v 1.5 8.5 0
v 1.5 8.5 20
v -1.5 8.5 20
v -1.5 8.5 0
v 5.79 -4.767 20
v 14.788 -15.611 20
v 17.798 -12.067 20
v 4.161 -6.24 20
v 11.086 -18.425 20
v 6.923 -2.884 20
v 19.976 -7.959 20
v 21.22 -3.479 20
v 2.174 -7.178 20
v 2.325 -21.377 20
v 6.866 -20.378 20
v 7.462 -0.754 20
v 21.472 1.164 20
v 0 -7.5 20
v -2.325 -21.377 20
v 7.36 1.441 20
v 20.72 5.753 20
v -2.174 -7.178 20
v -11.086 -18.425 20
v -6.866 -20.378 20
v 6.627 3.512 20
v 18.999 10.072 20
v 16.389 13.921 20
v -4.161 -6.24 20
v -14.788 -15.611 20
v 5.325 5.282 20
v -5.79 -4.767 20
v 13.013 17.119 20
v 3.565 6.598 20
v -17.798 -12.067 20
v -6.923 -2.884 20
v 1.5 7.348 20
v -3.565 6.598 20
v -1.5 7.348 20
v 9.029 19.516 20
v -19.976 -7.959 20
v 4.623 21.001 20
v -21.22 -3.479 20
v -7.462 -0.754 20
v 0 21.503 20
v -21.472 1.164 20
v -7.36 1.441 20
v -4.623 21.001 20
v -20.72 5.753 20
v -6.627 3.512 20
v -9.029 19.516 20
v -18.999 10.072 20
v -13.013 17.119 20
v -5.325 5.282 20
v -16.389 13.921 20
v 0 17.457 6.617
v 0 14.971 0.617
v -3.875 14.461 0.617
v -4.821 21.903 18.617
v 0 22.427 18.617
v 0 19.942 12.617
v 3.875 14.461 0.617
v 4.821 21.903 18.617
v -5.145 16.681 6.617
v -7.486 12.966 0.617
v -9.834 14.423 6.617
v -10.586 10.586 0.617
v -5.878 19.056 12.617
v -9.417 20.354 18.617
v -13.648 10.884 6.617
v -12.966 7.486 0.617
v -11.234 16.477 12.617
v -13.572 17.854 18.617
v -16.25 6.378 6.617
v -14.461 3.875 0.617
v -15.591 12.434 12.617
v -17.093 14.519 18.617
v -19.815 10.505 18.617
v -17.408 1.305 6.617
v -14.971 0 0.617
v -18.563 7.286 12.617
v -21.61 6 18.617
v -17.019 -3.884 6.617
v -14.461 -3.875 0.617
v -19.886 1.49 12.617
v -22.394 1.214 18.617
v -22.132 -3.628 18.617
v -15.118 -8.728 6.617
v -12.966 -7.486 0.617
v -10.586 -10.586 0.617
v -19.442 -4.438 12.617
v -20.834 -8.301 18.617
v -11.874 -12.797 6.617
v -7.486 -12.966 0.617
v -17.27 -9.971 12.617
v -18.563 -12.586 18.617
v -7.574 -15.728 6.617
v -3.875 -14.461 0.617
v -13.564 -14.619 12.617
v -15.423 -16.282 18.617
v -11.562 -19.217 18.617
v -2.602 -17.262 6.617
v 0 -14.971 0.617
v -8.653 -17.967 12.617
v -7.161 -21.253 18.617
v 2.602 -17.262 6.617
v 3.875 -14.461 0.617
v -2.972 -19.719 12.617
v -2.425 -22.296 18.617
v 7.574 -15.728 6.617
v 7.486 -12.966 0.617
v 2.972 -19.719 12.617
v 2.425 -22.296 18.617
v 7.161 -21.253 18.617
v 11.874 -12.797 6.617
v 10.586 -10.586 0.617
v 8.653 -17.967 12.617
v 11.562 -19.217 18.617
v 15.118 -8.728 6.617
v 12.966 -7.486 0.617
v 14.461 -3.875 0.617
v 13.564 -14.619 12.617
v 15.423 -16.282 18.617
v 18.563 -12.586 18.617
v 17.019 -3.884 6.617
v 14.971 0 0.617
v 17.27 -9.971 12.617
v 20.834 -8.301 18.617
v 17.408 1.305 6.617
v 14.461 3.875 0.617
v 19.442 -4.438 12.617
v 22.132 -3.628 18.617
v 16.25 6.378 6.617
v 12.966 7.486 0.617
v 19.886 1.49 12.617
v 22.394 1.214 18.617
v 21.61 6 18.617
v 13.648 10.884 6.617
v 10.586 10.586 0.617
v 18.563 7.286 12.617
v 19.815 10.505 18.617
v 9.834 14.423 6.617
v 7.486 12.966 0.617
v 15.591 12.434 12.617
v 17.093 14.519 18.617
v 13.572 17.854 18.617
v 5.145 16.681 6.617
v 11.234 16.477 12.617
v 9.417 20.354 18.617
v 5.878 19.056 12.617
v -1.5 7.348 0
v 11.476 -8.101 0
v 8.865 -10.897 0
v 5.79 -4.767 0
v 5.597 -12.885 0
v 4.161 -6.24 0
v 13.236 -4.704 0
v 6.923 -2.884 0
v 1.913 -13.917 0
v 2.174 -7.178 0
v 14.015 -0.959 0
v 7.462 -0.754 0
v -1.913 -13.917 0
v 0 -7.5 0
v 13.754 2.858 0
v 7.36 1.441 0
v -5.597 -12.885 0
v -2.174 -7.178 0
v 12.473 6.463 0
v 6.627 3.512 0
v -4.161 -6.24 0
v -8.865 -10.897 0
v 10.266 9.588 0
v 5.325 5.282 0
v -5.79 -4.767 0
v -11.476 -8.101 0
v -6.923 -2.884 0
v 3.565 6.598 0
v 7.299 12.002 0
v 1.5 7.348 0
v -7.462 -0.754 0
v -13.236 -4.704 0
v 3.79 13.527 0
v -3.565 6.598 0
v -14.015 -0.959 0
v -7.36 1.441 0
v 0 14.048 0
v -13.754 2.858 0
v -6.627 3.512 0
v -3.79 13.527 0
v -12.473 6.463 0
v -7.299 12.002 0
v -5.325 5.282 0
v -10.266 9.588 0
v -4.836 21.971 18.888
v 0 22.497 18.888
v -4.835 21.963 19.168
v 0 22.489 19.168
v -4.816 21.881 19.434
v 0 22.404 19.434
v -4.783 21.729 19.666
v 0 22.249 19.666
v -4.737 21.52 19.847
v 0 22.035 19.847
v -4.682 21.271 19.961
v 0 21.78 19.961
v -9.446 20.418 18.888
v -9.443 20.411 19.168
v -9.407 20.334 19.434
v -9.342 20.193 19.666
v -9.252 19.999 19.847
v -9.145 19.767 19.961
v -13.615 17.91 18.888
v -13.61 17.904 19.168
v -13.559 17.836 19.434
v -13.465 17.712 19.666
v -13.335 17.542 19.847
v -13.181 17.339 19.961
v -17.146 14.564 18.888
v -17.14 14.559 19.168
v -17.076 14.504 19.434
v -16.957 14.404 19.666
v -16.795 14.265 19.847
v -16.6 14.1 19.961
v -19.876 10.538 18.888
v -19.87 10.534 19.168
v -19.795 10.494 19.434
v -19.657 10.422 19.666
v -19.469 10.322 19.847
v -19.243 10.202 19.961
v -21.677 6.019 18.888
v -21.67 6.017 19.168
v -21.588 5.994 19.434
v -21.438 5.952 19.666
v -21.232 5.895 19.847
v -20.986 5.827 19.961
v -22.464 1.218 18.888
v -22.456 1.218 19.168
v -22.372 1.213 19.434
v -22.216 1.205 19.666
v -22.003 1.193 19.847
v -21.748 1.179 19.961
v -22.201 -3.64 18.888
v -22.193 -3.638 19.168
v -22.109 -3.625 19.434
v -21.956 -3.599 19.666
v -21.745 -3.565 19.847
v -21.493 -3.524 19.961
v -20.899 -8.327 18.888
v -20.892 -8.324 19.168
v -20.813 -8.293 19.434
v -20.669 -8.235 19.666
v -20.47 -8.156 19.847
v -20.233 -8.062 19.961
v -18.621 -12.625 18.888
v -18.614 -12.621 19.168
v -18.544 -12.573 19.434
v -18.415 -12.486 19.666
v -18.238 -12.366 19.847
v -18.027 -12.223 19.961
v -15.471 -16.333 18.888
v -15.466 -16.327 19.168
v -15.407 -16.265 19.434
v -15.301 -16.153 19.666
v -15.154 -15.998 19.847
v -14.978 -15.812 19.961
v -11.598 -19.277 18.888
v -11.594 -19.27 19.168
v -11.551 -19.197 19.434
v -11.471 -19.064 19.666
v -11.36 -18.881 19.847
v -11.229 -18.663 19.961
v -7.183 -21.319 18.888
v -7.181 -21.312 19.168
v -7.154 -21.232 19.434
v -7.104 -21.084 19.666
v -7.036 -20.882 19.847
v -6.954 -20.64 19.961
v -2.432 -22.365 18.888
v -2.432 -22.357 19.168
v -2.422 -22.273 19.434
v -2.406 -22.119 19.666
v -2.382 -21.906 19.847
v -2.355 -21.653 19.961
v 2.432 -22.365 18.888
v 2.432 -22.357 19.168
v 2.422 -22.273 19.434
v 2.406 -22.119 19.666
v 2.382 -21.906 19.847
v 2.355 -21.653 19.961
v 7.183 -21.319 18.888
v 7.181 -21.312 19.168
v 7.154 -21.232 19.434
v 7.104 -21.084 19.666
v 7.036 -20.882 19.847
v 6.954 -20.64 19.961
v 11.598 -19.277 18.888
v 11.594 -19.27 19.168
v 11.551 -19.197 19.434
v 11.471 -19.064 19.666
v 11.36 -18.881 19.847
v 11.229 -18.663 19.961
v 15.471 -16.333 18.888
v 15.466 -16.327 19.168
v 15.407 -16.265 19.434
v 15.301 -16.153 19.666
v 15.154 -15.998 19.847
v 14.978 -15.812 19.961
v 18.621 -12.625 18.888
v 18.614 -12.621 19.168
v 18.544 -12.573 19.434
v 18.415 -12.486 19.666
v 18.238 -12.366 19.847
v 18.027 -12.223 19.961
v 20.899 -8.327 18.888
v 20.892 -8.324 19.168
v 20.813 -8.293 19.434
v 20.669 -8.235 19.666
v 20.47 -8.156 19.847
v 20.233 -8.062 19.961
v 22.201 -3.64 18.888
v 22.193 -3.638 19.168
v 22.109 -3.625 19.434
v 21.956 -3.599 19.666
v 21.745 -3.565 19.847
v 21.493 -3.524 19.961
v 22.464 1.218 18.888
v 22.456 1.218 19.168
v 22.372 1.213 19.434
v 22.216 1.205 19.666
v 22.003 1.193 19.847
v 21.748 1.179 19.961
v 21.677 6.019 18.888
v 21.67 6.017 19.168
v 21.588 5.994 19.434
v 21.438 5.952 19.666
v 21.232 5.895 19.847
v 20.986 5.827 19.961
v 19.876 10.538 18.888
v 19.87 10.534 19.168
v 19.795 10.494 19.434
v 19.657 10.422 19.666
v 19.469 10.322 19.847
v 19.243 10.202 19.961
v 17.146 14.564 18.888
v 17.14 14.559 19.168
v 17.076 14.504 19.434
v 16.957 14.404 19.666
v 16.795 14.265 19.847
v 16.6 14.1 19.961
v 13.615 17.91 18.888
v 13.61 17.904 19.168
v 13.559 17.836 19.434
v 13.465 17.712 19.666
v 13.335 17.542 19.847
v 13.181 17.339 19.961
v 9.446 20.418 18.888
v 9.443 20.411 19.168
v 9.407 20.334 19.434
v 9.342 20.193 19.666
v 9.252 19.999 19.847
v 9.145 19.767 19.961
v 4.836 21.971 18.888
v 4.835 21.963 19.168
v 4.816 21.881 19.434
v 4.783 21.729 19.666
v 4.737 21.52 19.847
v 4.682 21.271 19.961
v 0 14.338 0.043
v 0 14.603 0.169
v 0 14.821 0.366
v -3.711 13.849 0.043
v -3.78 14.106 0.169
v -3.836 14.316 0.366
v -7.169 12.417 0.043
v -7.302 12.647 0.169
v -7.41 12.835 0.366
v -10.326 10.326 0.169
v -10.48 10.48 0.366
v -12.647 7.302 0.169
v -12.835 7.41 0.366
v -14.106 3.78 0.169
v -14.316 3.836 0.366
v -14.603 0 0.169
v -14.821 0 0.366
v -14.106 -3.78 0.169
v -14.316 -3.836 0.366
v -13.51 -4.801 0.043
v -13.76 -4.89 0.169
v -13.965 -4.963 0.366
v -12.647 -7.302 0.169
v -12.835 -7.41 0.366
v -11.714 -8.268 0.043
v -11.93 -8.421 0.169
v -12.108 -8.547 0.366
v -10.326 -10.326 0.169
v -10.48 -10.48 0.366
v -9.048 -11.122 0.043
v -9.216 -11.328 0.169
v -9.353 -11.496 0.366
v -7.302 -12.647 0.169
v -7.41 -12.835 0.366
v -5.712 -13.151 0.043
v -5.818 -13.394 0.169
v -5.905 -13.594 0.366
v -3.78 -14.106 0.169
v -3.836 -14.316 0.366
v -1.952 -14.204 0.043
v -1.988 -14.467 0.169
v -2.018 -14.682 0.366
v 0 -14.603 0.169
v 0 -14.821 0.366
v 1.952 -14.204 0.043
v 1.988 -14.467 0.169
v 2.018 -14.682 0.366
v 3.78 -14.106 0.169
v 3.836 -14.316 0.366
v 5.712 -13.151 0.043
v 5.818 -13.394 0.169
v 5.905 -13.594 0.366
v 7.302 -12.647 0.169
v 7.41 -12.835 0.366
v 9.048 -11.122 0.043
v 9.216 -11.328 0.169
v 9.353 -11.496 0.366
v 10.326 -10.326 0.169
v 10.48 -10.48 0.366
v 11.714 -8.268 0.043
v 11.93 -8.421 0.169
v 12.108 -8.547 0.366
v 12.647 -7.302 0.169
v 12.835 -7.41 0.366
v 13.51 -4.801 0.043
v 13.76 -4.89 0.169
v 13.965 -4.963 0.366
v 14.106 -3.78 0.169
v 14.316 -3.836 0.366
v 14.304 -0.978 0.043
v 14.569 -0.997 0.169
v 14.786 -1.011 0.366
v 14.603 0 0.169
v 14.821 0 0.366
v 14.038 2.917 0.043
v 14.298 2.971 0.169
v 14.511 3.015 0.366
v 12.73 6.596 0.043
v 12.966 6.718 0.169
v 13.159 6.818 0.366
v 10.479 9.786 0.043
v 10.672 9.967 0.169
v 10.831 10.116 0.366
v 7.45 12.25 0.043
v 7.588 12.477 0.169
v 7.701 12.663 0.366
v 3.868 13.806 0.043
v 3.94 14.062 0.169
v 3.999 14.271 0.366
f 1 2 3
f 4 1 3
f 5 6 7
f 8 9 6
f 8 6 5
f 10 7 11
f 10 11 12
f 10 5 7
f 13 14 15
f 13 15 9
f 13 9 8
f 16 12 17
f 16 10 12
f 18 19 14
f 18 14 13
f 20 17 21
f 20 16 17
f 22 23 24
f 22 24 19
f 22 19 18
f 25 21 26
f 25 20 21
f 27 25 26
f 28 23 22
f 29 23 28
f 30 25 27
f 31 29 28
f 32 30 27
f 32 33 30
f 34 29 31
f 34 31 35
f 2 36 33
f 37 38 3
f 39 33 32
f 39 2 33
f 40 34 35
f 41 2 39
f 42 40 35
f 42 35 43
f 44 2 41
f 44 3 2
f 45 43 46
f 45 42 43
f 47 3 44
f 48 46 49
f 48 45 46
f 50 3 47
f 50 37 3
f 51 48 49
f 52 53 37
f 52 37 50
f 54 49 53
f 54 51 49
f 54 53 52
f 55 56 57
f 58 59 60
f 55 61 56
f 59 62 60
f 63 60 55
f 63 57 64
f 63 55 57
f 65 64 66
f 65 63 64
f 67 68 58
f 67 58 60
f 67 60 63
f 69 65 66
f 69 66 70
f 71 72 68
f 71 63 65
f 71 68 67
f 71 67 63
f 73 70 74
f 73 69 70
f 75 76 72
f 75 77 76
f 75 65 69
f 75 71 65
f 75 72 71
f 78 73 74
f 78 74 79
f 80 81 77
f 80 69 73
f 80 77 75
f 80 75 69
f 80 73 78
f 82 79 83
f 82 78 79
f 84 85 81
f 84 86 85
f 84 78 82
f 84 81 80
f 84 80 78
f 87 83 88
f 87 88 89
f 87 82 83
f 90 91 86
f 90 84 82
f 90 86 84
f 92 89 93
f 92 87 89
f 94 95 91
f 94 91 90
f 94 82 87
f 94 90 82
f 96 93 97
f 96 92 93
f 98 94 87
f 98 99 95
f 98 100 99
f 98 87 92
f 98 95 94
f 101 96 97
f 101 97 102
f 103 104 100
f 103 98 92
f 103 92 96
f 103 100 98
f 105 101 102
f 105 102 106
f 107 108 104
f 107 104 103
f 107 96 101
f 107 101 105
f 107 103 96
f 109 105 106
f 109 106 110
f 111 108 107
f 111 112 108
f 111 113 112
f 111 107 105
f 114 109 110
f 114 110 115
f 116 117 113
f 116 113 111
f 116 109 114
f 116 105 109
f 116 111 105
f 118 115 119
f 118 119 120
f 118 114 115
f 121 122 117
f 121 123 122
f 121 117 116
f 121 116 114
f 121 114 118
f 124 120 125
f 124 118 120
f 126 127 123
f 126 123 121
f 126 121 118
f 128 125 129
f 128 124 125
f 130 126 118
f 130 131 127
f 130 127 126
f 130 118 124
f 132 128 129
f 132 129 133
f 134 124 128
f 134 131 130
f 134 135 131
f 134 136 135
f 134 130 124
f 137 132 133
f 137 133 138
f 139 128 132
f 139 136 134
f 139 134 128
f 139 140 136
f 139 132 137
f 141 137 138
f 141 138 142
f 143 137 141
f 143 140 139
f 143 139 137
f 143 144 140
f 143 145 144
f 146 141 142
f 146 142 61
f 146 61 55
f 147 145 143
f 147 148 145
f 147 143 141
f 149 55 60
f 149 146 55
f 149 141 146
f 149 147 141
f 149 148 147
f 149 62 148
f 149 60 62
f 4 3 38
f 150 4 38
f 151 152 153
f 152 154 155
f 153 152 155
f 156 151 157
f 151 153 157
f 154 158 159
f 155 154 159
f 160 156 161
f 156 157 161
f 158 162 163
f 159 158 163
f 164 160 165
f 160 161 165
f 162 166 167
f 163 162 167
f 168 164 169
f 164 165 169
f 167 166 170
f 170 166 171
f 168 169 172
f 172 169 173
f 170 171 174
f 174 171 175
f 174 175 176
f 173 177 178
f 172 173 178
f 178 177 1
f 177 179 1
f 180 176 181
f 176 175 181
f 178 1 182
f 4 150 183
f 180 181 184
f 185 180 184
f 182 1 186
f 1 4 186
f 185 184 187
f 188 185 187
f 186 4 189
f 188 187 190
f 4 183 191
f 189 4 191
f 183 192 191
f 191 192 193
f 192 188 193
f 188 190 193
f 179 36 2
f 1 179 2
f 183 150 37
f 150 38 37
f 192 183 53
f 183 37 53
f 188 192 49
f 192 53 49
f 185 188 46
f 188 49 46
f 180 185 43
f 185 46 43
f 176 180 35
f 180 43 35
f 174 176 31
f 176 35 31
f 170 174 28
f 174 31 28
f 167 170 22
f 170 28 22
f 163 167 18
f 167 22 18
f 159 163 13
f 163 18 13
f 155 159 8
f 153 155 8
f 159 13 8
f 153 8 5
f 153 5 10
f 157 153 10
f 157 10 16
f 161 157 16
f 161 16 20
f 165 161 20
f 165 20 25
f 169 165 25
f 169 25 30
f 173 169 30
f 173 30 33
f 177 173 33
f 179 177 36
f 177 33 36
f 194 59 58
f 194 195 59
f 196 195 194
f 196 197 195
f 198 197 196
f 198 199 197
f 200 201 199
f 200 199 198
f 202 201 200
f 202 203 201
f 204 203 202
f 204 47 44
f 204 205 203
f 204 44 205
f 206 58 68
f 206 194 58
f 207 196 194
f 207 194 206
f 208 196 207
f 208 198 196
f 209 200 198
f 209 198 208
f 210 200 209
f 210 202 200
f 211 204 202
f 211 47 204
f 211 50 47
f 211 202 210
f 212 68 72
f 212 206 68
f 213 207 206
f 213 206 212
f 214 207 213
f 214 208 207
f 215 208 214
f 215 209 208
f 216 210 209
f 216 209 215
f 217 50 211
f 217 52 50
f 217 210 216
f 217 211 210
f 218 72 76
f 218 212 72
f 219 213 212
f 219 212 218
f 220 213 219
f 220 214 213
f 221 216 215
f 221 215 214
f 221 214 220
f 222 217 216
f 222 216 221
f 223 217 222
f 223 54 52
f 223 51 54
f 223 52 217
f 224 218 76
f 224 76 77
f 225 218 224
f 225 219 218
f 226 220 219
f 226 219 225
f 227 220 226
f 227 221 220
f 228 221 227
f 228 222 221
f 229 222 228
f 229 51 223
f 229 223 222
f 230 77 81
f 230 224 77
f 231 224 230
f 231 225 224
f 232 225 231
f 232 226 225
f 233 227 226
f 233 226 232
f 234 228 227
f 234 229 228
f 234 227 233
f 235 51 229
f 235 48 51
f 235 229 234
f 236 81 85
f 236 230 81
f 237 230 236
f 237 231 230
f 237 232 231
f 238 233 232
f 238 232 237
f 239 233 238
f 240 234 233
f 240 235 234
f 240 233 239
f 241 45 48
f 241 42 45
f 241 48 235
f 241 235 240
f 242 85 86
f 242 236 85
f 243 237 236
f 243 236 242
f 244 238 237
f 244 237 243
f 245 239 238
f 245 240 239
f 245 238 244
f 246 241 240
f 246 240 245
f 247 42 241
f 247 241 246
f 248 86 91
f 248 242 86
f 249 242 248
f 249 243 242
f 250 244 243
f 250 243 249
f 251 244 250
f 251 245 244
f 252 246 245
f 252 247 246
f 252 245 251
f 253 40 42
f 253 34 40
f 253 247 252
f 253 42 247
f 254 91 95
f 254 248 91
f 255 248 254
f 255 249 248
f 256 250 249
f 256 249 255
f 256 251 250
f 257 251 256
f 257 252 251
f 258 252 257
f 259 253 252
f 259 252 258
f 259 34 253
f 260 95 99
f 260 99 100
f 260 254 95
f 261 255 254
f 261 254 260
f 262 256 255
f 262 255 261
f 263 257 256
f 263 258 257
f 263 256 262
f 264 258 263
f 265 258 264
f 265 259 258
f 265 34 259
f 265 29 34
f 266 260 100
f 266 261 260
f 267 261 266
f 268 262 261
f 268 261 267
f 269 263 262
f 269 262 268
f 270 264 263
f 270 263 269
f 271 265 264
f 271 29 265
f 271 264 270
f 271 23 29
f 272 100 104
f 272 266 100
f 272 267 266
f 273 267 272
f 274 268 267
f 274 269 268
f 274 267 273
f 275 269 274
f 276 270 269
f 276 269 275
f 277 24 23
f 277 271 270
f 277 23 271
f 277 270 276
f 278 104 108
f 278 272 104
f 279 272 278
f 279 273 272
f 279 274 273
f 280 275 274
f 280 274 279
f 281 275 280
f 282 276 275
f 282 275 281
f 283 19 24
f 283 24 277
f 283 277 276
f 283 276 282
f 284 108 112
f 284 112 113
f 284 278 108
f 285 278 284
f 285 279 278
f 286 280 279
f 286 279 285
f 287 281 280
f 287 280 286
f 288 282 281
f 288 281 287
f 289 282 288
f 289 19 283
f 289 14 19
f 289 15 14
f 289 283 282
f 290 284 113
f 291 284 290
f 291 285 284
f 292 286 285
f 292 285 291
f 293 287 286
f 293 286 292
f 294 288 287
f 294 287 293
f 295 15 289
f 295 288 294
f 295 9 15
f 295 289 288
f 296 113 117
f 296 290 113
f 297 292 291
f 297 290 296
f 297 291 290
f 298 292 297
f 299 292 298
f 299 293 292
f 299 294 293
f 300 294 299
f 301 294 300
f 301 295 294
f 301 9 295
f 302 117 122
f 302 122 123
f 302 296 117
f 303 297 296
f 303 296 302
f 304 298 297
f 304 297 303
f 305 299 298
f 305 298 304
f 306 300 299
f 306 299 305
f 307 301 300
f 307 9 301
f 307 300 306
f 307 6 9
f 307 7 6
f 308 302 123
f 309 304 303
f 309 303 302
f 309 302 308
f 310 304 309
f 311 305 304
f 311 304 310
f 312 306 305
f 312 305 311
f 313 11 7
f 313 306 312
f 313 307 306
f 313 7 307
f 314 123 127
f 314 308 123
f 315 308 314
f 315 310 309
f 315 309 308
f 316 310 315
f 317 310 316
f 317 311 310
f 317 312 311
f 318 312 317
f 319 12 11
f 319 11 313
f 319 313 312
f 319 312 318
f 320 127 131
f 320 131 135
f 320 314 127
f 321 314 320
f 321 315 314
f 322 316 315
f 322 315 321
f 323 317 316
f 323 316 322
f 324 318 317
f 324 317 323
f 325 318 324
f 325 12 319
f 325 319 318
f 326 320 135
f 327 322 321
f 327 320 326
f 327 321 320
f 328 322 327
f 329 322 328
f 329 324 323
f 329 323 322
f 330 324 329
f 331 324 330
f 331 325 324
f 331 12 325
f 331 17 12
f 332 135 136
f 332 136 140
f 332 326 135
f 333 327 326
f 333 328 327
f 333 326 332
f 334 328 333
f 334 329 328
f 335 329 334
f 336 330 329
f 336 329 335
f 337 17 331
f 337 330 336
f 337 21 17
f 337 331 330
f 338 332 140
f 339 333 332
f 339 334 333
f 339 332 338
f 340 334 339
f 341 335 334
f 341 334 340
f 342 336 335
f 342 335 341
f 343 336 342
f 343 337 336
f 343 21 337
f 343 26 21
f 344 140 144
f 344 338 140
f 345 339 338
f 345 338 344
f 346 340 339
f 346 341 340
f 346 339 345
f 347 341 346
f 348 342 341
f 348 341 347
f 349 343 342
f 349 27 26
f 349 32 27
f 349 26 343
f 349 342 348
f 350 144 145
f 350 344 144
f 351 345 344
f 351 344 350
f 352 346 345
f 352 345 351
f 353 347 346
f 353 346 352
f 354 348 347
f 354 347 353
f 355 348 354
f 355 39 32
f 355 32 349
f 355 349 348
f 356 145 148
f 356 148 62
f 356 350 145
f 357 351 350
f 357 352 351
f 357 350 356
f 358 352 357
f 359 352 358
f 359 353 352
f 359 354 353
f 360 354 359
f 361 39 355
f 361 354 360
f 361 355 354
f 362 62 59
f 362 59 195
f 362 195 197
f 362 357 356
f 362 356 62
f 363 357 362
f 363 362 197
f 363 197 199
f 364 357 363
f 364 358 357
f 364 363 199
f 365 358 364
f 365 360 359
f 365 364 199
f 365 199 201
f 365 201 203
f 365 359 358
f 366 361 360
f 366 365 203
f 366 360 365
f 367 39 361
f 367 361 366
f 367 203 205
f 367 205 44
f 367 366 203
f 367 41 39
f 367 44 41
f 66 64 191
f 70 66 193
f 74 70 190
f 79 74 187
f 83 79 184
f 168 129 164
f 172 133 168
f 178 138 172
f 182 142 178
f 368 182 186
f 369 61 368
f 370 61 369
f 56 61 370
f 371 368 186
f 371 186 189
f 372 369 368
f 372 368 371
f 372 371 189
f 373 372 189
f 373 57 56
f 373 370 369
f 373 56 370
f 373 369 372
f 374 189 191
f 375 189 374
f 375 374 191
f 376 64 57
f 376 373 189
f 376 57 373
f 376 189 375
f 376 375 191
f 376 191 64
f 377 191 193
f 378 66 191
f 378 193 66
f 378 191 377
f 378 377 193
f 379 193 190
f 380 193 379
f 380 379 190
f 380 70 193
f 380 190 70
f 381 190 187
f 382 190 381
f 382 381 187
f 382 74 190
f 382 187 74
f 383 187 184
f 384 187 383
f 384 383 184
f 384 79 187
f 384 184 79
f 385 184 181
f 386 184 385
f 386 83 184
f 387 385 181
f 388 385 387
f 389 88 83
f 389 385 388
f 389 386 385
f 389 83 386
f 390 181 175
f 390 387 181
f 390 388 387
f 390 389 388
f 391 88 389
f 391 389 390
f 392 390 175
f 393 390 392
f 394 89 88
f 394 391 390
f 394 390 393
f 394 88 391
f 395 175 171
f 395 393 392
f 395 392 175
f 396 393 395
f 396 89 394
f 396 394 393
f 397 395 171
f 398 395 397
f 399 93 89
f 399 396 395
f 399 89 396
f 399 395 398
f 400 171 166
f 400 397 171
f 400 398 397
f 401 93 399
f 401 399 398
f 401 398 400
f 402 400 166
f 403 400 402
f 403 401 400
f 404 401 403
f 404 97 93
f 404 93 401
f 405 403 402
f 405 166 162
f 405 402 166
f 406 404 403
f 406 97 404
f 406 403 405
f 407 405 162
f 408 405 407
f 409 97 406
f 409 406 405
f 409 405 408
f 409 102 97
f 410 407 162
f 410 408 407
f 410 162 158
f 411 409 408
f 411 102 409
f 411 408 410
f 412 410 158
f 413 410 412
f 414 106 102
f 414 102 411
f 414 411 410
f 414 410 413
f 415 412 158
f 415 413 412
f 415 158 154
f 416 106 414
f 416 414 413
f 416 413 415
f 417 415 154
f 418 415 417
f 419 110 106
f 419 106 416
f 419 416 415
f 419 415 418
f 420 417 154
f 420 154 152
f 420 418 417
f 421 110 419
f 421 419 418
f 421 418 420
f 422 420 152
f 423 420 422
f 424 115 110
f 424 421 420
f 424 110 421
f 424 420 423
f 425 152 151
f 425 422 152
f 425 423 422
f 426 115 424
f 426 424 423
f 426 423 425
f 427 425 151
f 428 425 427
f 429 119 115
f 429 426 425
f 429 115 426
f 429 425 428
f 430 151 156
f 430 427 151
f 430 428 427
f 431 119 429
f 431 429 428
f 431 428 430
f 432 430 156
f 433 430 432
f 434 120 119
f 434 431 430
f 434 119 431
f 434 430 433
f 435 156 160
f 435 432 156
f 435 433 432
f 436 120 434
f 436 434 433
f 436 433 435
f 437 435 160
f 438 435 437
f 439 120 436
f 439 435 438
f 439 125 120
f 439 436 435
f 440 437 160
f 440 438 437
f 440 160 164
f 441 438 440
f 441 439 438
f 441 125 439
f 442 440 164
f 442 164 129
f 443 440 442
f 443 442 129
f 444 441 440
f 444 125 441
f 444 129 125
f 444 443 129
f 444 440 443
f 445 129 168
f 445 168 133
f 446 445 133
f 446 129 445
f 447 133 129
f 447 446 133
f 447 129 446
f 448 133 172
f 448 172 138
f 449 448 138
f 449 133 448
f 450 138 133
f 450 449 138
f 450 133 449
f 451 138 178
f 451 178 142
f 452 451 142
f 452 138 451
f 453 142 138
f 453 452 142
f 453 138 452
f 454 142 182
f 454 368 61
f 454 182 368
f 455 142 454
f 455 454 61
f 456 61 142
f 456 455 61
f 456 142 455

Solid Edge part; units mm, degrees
sketch "Sketch1" plane through (0, 0, 0) normal (1, 0, 0) x (0, 1, 0)
  line L0 (3, 0) -> (3, 20)
  line L1 (3, 20) -> (23, 20)
  line L2 (23, 20) -> (14.7157, 0)
  line L3 (14.7157, 0) -> (3, 0)
  dimension "D1" = 20
  dimension "D2" = 20
  dimension "D3" = 3
  dimension "D4" = 11.7157
revolve "RevolvedProtrusion1" add sketch "Sketch1" angle 360 about axis through (0, 0, 0) along (0, 0, 1)
sketch "Sketch2" plane through (0, 0, 20) normal (0, 0, 1) x (1, 0, 0)
  circle A0 centre (0, 0) radius 7.5
  line L0 (1.5, 8.5) -> (-1.5, 8.5)
  line L1 (-1.5, 8.5) -> (-1.5, 6.5)
  line L2 (-1.5, 6.5) -> (1.5, 6.5)
  line L3 (1.5, 6.5) -> (1.5, 8.5)
  dimension "D1" = 6.5
  dimension "D2" = 15
  dimension "D3" = 2
  dimension "D4" = 3
extrude "Cutout1" cut sketch "Sketch2" against normal up to surface (20 mm away)
fillet "Round1" radius 1 2 edges at (-23, 0, 20) (-14.7157, 0, 0)
